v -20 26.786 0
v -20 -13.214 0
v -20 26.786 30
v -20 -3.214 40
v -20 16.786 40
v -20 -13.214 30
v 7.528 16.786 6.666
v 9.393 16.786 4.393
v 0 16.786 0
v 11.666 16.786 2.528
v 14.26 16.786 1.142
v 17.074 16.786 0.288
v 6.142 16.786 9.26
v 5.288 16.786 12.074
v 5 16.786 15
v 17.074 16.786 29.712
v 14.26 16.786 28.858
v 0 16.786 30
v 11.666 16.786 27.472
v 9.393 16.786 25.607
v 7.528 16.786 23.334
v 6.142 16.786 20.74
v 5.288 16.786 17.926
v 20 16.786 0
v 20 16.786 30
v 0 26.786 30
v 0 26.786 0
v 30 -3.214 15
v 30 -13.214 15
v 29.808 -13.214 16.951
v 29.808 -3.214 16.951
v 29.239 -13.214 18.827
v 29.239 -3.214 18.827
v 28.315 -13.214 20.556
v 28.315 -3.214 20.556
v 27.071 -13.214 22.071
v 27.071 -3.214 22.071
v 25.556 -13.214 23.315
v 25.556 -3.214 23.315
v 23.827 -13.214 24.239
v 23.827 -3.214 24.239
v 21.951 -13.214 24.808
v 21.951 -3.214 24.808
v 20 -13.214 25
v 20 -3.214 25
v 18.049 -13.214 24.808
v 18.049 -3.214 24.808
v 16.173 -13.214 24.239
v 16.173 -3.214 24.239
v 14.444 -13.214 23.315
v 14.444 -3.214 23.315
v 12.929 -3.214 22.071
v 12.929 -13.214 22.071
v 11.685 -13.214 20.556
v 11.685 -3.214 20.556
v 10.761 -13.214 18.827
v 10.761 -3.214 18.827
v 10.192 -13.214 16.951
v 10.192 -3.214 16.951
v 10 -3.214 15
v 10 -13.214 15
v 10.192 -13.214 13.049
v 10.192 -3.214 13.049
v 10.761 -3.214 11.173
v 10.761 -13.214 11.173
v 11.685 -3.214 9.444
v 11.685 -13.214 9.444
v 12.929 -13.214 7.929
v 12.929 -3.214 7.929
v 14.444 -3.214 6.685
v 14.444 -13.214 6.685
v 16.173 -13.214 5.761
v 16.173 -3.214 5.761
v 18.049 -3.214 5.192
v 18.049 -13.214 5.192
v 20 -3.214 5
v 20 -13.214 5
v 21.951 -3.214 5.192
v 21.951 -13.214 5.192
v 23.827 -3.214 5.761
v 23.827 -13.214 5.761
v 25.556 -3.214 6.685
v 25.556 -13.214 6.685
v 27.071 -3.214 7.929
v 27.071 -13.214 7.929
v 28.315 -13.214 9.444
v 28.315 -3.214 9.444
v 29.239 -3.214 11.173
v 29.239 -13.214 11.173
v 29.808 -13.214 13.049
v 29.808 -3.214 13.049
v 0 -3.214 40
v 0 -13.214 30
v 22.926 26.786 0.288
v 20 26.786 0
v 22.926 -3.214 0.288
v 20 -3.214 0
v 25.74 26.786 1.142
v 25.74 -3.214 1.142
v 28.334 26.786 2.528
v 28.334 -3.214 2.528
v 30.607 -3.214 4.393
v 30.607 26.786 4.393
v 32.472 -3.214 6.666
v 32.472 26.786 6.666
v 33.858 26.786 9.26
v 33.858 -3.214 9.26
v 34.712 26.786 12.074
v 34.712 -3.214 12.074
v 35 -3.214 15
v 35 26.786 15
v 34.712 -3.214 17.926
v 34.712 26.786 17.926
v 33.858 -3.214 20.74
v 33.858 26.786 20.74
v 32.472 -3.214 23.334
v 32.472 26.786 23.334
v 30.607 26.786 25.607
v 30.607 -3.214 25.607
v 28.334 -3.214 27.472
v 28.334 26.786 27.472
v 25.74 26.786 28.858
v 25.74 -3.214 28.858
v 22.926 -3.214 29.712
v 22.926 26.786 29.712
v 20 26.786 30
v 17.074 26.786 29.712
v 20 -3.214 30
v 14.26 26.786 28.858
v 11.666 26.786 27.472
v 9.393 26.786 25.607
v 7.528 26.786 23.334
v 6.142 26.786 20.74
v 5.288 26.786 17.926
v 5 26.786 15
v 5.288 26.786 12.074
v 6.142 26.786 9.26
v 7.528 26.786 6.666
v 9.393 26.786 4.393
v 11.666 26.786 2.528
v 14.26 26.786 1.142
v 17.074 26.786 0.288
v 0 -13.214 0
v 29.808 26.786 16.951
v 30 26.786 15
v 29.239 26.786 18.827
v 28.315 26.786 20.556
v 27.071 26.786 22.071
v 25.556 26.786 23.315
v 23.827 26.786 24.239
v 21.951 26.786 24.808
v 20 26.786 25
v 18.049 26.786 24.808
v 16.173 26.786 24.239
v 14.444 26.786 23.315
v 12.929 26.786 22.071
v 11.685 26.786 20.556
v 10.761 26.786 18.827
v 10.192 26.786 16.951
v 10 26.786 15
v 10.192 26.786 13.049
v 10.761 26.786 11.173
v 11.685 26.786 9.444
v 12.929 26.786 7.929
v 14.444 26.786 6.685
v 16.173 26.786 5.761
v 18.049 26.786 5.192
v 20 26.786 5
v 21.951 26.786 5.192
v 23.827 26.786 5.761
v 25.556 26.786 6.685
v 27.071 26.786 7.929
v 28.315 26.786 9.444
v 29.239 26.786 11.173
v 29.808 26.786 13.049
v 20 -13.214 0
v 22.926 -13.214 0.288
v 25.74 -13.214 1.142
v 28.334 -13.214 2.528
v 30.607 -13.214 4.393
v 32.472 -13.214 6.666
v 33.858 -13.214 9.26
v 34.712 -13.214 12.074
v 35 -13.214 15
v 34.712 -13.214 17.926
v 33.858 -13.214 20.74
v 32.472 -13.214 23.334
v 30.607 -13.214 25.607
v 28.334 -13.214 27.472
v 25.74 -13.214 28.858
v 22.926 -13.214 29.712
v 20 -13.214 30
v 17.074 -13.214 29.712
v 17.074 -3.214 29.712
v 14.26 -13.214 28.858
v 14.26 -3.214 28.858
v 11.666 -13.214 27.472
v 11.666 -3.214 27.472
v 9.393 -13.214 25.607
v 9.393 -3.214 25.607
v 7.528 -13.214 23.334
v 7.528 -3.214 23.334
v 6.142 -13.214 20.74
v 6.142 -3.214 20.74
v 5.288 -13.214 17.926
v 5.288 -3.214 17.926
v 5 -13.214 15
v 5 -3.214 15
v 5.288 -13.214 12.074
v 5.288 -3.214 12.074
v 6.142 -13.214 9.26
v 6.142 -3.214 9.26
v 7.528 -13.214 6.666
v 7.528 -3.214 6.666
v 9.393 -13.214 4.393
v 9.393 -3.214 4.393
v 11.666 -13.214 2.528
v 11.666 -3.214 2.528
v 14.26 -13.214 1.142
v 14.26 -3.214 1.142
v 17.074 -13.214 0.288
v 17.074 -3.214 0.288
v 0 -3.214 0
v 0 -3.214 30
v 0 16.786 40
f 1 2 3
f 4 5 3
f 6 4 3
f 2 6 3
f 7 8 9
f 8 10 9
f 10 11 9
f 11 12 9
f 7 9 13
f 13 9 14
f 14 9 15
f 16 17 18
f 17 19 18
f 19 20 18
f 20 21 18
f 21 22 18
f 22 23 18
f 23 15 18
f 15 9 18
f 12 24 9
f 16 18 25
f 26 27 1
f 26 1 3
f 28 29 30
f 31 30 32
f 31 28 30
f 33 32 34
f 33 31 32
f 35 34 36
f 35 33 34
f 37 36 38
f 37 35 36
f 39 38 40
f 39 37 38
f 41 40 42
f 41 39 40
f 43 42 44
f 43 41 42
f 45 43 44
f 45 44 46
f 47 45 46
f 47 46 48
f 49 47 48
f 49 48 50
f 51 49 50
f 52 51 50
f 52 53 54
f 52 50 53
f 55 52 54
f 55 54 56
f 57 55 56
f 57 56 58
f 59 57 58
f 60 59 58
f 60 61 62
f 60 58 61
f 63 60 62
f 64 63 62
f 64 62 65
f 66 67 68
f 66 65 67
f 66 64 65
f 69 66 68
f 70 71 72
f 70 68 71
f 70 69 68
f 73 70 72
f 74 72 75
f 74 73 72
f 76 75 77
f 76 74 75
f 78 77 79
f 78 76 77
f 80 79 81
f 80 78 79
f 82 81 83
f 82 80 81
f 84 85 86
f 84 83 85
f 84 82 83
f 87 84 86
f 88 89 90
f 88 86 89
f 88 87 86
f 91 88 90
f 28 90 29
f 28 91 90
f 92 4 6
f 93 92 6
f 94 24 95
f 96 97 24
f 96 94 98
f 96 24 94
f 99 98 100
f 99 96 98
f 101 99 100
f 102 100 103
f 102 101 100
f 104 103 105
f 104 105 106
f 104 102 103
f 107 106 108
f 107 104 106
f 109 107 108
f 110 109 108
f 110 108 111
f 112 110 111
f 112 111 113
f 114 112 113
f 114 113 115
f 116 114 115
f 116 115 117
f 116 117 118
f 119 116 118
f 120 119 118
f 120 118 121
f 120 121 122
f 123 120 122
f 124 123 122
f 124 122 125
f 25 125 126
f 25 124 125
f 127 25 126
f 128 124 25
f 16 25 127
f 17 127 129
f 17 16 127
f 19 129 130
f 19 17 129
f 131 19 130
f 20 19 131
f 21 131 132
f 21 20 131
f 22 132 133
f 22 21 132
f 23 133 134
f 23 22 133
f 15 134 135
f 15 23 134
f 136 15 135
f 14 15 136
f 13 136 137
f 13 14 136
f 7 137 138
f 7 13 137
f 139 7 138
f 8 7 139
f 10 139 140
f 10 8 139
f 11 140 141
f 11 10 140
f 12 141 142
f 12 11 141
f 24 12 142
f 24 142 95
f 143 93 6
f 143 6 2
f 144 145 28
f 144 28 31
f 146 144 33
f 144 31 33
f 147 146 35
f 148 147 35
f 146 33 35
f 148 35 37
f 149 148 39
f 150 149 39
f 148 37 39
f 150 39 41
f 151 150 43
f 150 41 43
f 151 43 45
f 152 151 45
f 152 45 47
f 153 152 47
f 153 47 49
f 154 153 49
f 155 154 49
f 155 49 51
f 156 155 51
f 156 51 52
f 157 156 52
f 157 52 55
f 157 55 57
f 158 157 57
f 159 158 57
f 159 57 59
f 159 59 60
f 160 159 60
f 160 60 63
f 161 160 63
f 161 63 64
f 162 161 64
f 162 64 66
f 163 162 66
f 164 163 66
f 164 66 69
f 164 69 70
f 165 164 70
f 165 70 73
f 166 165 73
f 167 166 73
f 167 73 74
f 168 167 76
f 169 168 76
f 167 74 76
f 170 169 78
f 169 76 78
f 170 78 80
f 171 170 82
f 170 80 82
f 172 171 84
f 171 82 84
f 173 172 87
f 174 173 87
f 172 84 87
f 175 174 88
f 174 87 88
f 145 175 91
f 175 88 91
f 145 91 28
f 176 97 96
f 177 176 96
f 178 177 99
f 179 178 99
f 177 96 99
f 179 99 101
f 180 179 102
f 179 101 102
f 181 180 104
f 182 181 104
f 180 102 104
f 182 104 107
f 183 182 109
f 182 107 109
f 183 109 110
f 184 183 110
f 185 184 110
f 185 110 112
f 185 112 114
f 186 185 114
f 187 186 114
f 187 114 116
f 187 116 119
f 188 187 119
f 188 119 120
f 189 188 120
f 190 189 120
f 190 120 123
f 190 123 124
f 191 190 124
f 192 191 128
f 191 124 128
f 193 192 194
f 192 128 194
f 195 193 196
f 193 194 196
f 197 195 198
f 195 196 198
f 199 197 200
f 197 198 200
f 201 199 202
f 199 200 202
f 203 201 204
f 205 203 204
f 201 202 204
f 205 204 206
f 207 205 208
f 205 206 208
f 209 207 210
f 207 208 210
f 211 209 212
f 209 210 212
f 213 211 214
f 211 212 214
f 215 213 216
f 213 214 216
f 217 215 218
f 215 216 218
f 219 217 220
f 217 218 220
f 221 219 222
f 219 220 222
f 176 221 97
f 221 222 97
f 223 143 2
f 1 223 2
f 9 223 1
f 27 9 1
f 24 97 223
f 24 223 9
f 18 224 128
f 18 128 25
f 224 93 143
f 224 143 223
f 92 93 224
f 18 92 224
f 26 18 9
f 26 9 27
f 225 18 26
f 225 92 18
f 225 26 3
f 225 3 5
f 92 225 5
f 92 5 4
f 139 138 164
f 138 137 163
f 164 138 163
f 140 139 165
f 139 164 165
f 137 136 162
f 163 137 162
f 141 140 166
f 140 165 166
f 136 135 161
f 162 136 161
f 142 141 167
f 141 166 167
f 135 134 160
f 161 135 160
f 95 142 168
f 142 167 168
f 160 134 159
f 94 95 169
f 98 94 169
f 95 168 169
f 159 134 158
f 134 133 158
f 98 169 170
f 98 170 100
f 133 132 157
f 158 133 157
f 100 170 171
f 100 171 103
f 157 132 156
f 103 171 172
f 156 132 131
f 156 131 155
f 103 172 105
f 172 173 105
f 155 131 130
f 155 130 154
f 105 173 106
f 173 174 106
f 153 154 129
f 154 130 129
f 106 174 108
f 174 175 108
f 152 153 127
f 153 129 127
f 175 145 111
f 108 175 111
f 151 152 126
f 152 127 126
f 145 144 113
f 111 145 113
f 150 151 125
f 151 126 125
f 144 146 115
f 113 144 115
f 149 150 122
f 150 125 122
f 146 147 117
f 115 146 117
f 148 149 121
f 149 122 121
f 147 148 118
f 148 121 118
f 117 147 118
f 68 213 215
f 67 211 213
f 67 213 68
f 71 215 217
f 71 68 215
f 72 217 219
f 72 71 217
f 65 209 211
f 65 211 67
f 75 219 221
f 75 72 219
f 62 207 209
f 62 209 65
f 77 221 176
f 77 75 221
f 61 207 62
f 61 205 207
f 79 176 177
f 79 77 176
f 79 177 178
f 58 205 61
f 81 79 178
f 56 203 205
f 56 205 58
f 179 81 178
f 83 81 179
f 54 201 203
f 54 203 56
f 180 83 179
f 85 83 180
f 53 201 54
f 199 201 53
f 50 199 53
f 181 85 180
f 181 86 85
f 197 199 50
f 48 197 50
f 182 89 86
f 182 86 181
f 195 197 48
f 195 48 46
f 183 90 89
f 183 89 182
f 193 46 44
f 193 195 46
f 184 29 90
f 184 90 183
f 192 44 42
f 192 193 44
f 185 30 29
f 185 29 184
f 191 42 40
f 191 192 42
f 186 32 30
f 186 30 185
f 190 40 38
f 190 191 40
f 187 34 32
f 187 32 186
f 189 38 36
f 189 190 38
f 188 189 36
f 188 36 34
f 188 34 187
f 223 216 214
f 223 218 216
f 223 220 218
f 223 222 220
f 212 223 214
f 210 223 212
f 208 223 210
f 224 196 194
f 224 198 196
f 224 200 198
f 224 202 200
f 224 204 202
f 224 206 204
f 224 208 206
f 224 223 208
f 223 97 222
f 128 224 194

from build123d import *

# Parameters (mm, degrees)
F1_DEPTH = 20
F2_W     = 20
F2_H     = 30
F3_DEPTH = 20
F5_DEPTH = 10
F6_DEPTH = 40
F7_R     = 10
F8_DEPTH = 30.001
F9_DEPTH = 10.001


with BuildPart() as f1:
    # F0 (on Right) → F1 (new body)
    with BuildSketch(Plane.YZ):
        Polygon((-13.2142865657, 0), (26.7857134343, 0), (26.7857134343, 30), (16.7857134343, 40), (-3.2142865657, 40), (-13.2142865657, 30), align=None)
    extrude(amount=-F1_DEPTH)

    # F2 (on face) → F3 (join)
    with BuildSketch(Plane.YZ):
        with Locations((6.7857134343, 15)):
            Rectangle(F2_W, F2_H)
    extrude(amount=F3_DEPTH)

    # F4 (on face) → F5 (join)
    with BuildSketch(Plane.XZ.offset(3.2142865657)):
        with BuildLine():
            ThreePointArc((35, 15), (30.6066017178, 25.6066017178), (20, 30))
            ThreePointArc((20, 30), (5, 15), (20, 0))
            ThreePointArc((20, 0), (30.6066017178, 4.3933982822), (35, 15))
        make_face()
    extrude(amount=F5_DEPTH)

    # F6 (add): a face of the model
    f6_faces = [f1.faces().sort_by_distance(p)[0] for p in [
        (20, -13.2142865657, 15),
    ]]
    extrude(f6_faces, amount=-F6_DEPTH)

    # F7 (on face) → F8 (cut, through all)
    with BuildSketch(Plane.XZ.offset(3.2142865657)):
        with Locations((20, 15)):
            Circle(F7_R)
    extrude(amount=-F8_DEPTH, mode=Mode.SUBTRACT)

    # F7 (on face) → F9 (cut, through all)
    with BuildSketch(Plane.XZ.offset(3.2142865657)):
        with Locations((20, 15)):
            Circle(F7_R)
    extrude(amount=F9_DEPTH, mode=Mode.SUBTRACT)


solid = f1.part
